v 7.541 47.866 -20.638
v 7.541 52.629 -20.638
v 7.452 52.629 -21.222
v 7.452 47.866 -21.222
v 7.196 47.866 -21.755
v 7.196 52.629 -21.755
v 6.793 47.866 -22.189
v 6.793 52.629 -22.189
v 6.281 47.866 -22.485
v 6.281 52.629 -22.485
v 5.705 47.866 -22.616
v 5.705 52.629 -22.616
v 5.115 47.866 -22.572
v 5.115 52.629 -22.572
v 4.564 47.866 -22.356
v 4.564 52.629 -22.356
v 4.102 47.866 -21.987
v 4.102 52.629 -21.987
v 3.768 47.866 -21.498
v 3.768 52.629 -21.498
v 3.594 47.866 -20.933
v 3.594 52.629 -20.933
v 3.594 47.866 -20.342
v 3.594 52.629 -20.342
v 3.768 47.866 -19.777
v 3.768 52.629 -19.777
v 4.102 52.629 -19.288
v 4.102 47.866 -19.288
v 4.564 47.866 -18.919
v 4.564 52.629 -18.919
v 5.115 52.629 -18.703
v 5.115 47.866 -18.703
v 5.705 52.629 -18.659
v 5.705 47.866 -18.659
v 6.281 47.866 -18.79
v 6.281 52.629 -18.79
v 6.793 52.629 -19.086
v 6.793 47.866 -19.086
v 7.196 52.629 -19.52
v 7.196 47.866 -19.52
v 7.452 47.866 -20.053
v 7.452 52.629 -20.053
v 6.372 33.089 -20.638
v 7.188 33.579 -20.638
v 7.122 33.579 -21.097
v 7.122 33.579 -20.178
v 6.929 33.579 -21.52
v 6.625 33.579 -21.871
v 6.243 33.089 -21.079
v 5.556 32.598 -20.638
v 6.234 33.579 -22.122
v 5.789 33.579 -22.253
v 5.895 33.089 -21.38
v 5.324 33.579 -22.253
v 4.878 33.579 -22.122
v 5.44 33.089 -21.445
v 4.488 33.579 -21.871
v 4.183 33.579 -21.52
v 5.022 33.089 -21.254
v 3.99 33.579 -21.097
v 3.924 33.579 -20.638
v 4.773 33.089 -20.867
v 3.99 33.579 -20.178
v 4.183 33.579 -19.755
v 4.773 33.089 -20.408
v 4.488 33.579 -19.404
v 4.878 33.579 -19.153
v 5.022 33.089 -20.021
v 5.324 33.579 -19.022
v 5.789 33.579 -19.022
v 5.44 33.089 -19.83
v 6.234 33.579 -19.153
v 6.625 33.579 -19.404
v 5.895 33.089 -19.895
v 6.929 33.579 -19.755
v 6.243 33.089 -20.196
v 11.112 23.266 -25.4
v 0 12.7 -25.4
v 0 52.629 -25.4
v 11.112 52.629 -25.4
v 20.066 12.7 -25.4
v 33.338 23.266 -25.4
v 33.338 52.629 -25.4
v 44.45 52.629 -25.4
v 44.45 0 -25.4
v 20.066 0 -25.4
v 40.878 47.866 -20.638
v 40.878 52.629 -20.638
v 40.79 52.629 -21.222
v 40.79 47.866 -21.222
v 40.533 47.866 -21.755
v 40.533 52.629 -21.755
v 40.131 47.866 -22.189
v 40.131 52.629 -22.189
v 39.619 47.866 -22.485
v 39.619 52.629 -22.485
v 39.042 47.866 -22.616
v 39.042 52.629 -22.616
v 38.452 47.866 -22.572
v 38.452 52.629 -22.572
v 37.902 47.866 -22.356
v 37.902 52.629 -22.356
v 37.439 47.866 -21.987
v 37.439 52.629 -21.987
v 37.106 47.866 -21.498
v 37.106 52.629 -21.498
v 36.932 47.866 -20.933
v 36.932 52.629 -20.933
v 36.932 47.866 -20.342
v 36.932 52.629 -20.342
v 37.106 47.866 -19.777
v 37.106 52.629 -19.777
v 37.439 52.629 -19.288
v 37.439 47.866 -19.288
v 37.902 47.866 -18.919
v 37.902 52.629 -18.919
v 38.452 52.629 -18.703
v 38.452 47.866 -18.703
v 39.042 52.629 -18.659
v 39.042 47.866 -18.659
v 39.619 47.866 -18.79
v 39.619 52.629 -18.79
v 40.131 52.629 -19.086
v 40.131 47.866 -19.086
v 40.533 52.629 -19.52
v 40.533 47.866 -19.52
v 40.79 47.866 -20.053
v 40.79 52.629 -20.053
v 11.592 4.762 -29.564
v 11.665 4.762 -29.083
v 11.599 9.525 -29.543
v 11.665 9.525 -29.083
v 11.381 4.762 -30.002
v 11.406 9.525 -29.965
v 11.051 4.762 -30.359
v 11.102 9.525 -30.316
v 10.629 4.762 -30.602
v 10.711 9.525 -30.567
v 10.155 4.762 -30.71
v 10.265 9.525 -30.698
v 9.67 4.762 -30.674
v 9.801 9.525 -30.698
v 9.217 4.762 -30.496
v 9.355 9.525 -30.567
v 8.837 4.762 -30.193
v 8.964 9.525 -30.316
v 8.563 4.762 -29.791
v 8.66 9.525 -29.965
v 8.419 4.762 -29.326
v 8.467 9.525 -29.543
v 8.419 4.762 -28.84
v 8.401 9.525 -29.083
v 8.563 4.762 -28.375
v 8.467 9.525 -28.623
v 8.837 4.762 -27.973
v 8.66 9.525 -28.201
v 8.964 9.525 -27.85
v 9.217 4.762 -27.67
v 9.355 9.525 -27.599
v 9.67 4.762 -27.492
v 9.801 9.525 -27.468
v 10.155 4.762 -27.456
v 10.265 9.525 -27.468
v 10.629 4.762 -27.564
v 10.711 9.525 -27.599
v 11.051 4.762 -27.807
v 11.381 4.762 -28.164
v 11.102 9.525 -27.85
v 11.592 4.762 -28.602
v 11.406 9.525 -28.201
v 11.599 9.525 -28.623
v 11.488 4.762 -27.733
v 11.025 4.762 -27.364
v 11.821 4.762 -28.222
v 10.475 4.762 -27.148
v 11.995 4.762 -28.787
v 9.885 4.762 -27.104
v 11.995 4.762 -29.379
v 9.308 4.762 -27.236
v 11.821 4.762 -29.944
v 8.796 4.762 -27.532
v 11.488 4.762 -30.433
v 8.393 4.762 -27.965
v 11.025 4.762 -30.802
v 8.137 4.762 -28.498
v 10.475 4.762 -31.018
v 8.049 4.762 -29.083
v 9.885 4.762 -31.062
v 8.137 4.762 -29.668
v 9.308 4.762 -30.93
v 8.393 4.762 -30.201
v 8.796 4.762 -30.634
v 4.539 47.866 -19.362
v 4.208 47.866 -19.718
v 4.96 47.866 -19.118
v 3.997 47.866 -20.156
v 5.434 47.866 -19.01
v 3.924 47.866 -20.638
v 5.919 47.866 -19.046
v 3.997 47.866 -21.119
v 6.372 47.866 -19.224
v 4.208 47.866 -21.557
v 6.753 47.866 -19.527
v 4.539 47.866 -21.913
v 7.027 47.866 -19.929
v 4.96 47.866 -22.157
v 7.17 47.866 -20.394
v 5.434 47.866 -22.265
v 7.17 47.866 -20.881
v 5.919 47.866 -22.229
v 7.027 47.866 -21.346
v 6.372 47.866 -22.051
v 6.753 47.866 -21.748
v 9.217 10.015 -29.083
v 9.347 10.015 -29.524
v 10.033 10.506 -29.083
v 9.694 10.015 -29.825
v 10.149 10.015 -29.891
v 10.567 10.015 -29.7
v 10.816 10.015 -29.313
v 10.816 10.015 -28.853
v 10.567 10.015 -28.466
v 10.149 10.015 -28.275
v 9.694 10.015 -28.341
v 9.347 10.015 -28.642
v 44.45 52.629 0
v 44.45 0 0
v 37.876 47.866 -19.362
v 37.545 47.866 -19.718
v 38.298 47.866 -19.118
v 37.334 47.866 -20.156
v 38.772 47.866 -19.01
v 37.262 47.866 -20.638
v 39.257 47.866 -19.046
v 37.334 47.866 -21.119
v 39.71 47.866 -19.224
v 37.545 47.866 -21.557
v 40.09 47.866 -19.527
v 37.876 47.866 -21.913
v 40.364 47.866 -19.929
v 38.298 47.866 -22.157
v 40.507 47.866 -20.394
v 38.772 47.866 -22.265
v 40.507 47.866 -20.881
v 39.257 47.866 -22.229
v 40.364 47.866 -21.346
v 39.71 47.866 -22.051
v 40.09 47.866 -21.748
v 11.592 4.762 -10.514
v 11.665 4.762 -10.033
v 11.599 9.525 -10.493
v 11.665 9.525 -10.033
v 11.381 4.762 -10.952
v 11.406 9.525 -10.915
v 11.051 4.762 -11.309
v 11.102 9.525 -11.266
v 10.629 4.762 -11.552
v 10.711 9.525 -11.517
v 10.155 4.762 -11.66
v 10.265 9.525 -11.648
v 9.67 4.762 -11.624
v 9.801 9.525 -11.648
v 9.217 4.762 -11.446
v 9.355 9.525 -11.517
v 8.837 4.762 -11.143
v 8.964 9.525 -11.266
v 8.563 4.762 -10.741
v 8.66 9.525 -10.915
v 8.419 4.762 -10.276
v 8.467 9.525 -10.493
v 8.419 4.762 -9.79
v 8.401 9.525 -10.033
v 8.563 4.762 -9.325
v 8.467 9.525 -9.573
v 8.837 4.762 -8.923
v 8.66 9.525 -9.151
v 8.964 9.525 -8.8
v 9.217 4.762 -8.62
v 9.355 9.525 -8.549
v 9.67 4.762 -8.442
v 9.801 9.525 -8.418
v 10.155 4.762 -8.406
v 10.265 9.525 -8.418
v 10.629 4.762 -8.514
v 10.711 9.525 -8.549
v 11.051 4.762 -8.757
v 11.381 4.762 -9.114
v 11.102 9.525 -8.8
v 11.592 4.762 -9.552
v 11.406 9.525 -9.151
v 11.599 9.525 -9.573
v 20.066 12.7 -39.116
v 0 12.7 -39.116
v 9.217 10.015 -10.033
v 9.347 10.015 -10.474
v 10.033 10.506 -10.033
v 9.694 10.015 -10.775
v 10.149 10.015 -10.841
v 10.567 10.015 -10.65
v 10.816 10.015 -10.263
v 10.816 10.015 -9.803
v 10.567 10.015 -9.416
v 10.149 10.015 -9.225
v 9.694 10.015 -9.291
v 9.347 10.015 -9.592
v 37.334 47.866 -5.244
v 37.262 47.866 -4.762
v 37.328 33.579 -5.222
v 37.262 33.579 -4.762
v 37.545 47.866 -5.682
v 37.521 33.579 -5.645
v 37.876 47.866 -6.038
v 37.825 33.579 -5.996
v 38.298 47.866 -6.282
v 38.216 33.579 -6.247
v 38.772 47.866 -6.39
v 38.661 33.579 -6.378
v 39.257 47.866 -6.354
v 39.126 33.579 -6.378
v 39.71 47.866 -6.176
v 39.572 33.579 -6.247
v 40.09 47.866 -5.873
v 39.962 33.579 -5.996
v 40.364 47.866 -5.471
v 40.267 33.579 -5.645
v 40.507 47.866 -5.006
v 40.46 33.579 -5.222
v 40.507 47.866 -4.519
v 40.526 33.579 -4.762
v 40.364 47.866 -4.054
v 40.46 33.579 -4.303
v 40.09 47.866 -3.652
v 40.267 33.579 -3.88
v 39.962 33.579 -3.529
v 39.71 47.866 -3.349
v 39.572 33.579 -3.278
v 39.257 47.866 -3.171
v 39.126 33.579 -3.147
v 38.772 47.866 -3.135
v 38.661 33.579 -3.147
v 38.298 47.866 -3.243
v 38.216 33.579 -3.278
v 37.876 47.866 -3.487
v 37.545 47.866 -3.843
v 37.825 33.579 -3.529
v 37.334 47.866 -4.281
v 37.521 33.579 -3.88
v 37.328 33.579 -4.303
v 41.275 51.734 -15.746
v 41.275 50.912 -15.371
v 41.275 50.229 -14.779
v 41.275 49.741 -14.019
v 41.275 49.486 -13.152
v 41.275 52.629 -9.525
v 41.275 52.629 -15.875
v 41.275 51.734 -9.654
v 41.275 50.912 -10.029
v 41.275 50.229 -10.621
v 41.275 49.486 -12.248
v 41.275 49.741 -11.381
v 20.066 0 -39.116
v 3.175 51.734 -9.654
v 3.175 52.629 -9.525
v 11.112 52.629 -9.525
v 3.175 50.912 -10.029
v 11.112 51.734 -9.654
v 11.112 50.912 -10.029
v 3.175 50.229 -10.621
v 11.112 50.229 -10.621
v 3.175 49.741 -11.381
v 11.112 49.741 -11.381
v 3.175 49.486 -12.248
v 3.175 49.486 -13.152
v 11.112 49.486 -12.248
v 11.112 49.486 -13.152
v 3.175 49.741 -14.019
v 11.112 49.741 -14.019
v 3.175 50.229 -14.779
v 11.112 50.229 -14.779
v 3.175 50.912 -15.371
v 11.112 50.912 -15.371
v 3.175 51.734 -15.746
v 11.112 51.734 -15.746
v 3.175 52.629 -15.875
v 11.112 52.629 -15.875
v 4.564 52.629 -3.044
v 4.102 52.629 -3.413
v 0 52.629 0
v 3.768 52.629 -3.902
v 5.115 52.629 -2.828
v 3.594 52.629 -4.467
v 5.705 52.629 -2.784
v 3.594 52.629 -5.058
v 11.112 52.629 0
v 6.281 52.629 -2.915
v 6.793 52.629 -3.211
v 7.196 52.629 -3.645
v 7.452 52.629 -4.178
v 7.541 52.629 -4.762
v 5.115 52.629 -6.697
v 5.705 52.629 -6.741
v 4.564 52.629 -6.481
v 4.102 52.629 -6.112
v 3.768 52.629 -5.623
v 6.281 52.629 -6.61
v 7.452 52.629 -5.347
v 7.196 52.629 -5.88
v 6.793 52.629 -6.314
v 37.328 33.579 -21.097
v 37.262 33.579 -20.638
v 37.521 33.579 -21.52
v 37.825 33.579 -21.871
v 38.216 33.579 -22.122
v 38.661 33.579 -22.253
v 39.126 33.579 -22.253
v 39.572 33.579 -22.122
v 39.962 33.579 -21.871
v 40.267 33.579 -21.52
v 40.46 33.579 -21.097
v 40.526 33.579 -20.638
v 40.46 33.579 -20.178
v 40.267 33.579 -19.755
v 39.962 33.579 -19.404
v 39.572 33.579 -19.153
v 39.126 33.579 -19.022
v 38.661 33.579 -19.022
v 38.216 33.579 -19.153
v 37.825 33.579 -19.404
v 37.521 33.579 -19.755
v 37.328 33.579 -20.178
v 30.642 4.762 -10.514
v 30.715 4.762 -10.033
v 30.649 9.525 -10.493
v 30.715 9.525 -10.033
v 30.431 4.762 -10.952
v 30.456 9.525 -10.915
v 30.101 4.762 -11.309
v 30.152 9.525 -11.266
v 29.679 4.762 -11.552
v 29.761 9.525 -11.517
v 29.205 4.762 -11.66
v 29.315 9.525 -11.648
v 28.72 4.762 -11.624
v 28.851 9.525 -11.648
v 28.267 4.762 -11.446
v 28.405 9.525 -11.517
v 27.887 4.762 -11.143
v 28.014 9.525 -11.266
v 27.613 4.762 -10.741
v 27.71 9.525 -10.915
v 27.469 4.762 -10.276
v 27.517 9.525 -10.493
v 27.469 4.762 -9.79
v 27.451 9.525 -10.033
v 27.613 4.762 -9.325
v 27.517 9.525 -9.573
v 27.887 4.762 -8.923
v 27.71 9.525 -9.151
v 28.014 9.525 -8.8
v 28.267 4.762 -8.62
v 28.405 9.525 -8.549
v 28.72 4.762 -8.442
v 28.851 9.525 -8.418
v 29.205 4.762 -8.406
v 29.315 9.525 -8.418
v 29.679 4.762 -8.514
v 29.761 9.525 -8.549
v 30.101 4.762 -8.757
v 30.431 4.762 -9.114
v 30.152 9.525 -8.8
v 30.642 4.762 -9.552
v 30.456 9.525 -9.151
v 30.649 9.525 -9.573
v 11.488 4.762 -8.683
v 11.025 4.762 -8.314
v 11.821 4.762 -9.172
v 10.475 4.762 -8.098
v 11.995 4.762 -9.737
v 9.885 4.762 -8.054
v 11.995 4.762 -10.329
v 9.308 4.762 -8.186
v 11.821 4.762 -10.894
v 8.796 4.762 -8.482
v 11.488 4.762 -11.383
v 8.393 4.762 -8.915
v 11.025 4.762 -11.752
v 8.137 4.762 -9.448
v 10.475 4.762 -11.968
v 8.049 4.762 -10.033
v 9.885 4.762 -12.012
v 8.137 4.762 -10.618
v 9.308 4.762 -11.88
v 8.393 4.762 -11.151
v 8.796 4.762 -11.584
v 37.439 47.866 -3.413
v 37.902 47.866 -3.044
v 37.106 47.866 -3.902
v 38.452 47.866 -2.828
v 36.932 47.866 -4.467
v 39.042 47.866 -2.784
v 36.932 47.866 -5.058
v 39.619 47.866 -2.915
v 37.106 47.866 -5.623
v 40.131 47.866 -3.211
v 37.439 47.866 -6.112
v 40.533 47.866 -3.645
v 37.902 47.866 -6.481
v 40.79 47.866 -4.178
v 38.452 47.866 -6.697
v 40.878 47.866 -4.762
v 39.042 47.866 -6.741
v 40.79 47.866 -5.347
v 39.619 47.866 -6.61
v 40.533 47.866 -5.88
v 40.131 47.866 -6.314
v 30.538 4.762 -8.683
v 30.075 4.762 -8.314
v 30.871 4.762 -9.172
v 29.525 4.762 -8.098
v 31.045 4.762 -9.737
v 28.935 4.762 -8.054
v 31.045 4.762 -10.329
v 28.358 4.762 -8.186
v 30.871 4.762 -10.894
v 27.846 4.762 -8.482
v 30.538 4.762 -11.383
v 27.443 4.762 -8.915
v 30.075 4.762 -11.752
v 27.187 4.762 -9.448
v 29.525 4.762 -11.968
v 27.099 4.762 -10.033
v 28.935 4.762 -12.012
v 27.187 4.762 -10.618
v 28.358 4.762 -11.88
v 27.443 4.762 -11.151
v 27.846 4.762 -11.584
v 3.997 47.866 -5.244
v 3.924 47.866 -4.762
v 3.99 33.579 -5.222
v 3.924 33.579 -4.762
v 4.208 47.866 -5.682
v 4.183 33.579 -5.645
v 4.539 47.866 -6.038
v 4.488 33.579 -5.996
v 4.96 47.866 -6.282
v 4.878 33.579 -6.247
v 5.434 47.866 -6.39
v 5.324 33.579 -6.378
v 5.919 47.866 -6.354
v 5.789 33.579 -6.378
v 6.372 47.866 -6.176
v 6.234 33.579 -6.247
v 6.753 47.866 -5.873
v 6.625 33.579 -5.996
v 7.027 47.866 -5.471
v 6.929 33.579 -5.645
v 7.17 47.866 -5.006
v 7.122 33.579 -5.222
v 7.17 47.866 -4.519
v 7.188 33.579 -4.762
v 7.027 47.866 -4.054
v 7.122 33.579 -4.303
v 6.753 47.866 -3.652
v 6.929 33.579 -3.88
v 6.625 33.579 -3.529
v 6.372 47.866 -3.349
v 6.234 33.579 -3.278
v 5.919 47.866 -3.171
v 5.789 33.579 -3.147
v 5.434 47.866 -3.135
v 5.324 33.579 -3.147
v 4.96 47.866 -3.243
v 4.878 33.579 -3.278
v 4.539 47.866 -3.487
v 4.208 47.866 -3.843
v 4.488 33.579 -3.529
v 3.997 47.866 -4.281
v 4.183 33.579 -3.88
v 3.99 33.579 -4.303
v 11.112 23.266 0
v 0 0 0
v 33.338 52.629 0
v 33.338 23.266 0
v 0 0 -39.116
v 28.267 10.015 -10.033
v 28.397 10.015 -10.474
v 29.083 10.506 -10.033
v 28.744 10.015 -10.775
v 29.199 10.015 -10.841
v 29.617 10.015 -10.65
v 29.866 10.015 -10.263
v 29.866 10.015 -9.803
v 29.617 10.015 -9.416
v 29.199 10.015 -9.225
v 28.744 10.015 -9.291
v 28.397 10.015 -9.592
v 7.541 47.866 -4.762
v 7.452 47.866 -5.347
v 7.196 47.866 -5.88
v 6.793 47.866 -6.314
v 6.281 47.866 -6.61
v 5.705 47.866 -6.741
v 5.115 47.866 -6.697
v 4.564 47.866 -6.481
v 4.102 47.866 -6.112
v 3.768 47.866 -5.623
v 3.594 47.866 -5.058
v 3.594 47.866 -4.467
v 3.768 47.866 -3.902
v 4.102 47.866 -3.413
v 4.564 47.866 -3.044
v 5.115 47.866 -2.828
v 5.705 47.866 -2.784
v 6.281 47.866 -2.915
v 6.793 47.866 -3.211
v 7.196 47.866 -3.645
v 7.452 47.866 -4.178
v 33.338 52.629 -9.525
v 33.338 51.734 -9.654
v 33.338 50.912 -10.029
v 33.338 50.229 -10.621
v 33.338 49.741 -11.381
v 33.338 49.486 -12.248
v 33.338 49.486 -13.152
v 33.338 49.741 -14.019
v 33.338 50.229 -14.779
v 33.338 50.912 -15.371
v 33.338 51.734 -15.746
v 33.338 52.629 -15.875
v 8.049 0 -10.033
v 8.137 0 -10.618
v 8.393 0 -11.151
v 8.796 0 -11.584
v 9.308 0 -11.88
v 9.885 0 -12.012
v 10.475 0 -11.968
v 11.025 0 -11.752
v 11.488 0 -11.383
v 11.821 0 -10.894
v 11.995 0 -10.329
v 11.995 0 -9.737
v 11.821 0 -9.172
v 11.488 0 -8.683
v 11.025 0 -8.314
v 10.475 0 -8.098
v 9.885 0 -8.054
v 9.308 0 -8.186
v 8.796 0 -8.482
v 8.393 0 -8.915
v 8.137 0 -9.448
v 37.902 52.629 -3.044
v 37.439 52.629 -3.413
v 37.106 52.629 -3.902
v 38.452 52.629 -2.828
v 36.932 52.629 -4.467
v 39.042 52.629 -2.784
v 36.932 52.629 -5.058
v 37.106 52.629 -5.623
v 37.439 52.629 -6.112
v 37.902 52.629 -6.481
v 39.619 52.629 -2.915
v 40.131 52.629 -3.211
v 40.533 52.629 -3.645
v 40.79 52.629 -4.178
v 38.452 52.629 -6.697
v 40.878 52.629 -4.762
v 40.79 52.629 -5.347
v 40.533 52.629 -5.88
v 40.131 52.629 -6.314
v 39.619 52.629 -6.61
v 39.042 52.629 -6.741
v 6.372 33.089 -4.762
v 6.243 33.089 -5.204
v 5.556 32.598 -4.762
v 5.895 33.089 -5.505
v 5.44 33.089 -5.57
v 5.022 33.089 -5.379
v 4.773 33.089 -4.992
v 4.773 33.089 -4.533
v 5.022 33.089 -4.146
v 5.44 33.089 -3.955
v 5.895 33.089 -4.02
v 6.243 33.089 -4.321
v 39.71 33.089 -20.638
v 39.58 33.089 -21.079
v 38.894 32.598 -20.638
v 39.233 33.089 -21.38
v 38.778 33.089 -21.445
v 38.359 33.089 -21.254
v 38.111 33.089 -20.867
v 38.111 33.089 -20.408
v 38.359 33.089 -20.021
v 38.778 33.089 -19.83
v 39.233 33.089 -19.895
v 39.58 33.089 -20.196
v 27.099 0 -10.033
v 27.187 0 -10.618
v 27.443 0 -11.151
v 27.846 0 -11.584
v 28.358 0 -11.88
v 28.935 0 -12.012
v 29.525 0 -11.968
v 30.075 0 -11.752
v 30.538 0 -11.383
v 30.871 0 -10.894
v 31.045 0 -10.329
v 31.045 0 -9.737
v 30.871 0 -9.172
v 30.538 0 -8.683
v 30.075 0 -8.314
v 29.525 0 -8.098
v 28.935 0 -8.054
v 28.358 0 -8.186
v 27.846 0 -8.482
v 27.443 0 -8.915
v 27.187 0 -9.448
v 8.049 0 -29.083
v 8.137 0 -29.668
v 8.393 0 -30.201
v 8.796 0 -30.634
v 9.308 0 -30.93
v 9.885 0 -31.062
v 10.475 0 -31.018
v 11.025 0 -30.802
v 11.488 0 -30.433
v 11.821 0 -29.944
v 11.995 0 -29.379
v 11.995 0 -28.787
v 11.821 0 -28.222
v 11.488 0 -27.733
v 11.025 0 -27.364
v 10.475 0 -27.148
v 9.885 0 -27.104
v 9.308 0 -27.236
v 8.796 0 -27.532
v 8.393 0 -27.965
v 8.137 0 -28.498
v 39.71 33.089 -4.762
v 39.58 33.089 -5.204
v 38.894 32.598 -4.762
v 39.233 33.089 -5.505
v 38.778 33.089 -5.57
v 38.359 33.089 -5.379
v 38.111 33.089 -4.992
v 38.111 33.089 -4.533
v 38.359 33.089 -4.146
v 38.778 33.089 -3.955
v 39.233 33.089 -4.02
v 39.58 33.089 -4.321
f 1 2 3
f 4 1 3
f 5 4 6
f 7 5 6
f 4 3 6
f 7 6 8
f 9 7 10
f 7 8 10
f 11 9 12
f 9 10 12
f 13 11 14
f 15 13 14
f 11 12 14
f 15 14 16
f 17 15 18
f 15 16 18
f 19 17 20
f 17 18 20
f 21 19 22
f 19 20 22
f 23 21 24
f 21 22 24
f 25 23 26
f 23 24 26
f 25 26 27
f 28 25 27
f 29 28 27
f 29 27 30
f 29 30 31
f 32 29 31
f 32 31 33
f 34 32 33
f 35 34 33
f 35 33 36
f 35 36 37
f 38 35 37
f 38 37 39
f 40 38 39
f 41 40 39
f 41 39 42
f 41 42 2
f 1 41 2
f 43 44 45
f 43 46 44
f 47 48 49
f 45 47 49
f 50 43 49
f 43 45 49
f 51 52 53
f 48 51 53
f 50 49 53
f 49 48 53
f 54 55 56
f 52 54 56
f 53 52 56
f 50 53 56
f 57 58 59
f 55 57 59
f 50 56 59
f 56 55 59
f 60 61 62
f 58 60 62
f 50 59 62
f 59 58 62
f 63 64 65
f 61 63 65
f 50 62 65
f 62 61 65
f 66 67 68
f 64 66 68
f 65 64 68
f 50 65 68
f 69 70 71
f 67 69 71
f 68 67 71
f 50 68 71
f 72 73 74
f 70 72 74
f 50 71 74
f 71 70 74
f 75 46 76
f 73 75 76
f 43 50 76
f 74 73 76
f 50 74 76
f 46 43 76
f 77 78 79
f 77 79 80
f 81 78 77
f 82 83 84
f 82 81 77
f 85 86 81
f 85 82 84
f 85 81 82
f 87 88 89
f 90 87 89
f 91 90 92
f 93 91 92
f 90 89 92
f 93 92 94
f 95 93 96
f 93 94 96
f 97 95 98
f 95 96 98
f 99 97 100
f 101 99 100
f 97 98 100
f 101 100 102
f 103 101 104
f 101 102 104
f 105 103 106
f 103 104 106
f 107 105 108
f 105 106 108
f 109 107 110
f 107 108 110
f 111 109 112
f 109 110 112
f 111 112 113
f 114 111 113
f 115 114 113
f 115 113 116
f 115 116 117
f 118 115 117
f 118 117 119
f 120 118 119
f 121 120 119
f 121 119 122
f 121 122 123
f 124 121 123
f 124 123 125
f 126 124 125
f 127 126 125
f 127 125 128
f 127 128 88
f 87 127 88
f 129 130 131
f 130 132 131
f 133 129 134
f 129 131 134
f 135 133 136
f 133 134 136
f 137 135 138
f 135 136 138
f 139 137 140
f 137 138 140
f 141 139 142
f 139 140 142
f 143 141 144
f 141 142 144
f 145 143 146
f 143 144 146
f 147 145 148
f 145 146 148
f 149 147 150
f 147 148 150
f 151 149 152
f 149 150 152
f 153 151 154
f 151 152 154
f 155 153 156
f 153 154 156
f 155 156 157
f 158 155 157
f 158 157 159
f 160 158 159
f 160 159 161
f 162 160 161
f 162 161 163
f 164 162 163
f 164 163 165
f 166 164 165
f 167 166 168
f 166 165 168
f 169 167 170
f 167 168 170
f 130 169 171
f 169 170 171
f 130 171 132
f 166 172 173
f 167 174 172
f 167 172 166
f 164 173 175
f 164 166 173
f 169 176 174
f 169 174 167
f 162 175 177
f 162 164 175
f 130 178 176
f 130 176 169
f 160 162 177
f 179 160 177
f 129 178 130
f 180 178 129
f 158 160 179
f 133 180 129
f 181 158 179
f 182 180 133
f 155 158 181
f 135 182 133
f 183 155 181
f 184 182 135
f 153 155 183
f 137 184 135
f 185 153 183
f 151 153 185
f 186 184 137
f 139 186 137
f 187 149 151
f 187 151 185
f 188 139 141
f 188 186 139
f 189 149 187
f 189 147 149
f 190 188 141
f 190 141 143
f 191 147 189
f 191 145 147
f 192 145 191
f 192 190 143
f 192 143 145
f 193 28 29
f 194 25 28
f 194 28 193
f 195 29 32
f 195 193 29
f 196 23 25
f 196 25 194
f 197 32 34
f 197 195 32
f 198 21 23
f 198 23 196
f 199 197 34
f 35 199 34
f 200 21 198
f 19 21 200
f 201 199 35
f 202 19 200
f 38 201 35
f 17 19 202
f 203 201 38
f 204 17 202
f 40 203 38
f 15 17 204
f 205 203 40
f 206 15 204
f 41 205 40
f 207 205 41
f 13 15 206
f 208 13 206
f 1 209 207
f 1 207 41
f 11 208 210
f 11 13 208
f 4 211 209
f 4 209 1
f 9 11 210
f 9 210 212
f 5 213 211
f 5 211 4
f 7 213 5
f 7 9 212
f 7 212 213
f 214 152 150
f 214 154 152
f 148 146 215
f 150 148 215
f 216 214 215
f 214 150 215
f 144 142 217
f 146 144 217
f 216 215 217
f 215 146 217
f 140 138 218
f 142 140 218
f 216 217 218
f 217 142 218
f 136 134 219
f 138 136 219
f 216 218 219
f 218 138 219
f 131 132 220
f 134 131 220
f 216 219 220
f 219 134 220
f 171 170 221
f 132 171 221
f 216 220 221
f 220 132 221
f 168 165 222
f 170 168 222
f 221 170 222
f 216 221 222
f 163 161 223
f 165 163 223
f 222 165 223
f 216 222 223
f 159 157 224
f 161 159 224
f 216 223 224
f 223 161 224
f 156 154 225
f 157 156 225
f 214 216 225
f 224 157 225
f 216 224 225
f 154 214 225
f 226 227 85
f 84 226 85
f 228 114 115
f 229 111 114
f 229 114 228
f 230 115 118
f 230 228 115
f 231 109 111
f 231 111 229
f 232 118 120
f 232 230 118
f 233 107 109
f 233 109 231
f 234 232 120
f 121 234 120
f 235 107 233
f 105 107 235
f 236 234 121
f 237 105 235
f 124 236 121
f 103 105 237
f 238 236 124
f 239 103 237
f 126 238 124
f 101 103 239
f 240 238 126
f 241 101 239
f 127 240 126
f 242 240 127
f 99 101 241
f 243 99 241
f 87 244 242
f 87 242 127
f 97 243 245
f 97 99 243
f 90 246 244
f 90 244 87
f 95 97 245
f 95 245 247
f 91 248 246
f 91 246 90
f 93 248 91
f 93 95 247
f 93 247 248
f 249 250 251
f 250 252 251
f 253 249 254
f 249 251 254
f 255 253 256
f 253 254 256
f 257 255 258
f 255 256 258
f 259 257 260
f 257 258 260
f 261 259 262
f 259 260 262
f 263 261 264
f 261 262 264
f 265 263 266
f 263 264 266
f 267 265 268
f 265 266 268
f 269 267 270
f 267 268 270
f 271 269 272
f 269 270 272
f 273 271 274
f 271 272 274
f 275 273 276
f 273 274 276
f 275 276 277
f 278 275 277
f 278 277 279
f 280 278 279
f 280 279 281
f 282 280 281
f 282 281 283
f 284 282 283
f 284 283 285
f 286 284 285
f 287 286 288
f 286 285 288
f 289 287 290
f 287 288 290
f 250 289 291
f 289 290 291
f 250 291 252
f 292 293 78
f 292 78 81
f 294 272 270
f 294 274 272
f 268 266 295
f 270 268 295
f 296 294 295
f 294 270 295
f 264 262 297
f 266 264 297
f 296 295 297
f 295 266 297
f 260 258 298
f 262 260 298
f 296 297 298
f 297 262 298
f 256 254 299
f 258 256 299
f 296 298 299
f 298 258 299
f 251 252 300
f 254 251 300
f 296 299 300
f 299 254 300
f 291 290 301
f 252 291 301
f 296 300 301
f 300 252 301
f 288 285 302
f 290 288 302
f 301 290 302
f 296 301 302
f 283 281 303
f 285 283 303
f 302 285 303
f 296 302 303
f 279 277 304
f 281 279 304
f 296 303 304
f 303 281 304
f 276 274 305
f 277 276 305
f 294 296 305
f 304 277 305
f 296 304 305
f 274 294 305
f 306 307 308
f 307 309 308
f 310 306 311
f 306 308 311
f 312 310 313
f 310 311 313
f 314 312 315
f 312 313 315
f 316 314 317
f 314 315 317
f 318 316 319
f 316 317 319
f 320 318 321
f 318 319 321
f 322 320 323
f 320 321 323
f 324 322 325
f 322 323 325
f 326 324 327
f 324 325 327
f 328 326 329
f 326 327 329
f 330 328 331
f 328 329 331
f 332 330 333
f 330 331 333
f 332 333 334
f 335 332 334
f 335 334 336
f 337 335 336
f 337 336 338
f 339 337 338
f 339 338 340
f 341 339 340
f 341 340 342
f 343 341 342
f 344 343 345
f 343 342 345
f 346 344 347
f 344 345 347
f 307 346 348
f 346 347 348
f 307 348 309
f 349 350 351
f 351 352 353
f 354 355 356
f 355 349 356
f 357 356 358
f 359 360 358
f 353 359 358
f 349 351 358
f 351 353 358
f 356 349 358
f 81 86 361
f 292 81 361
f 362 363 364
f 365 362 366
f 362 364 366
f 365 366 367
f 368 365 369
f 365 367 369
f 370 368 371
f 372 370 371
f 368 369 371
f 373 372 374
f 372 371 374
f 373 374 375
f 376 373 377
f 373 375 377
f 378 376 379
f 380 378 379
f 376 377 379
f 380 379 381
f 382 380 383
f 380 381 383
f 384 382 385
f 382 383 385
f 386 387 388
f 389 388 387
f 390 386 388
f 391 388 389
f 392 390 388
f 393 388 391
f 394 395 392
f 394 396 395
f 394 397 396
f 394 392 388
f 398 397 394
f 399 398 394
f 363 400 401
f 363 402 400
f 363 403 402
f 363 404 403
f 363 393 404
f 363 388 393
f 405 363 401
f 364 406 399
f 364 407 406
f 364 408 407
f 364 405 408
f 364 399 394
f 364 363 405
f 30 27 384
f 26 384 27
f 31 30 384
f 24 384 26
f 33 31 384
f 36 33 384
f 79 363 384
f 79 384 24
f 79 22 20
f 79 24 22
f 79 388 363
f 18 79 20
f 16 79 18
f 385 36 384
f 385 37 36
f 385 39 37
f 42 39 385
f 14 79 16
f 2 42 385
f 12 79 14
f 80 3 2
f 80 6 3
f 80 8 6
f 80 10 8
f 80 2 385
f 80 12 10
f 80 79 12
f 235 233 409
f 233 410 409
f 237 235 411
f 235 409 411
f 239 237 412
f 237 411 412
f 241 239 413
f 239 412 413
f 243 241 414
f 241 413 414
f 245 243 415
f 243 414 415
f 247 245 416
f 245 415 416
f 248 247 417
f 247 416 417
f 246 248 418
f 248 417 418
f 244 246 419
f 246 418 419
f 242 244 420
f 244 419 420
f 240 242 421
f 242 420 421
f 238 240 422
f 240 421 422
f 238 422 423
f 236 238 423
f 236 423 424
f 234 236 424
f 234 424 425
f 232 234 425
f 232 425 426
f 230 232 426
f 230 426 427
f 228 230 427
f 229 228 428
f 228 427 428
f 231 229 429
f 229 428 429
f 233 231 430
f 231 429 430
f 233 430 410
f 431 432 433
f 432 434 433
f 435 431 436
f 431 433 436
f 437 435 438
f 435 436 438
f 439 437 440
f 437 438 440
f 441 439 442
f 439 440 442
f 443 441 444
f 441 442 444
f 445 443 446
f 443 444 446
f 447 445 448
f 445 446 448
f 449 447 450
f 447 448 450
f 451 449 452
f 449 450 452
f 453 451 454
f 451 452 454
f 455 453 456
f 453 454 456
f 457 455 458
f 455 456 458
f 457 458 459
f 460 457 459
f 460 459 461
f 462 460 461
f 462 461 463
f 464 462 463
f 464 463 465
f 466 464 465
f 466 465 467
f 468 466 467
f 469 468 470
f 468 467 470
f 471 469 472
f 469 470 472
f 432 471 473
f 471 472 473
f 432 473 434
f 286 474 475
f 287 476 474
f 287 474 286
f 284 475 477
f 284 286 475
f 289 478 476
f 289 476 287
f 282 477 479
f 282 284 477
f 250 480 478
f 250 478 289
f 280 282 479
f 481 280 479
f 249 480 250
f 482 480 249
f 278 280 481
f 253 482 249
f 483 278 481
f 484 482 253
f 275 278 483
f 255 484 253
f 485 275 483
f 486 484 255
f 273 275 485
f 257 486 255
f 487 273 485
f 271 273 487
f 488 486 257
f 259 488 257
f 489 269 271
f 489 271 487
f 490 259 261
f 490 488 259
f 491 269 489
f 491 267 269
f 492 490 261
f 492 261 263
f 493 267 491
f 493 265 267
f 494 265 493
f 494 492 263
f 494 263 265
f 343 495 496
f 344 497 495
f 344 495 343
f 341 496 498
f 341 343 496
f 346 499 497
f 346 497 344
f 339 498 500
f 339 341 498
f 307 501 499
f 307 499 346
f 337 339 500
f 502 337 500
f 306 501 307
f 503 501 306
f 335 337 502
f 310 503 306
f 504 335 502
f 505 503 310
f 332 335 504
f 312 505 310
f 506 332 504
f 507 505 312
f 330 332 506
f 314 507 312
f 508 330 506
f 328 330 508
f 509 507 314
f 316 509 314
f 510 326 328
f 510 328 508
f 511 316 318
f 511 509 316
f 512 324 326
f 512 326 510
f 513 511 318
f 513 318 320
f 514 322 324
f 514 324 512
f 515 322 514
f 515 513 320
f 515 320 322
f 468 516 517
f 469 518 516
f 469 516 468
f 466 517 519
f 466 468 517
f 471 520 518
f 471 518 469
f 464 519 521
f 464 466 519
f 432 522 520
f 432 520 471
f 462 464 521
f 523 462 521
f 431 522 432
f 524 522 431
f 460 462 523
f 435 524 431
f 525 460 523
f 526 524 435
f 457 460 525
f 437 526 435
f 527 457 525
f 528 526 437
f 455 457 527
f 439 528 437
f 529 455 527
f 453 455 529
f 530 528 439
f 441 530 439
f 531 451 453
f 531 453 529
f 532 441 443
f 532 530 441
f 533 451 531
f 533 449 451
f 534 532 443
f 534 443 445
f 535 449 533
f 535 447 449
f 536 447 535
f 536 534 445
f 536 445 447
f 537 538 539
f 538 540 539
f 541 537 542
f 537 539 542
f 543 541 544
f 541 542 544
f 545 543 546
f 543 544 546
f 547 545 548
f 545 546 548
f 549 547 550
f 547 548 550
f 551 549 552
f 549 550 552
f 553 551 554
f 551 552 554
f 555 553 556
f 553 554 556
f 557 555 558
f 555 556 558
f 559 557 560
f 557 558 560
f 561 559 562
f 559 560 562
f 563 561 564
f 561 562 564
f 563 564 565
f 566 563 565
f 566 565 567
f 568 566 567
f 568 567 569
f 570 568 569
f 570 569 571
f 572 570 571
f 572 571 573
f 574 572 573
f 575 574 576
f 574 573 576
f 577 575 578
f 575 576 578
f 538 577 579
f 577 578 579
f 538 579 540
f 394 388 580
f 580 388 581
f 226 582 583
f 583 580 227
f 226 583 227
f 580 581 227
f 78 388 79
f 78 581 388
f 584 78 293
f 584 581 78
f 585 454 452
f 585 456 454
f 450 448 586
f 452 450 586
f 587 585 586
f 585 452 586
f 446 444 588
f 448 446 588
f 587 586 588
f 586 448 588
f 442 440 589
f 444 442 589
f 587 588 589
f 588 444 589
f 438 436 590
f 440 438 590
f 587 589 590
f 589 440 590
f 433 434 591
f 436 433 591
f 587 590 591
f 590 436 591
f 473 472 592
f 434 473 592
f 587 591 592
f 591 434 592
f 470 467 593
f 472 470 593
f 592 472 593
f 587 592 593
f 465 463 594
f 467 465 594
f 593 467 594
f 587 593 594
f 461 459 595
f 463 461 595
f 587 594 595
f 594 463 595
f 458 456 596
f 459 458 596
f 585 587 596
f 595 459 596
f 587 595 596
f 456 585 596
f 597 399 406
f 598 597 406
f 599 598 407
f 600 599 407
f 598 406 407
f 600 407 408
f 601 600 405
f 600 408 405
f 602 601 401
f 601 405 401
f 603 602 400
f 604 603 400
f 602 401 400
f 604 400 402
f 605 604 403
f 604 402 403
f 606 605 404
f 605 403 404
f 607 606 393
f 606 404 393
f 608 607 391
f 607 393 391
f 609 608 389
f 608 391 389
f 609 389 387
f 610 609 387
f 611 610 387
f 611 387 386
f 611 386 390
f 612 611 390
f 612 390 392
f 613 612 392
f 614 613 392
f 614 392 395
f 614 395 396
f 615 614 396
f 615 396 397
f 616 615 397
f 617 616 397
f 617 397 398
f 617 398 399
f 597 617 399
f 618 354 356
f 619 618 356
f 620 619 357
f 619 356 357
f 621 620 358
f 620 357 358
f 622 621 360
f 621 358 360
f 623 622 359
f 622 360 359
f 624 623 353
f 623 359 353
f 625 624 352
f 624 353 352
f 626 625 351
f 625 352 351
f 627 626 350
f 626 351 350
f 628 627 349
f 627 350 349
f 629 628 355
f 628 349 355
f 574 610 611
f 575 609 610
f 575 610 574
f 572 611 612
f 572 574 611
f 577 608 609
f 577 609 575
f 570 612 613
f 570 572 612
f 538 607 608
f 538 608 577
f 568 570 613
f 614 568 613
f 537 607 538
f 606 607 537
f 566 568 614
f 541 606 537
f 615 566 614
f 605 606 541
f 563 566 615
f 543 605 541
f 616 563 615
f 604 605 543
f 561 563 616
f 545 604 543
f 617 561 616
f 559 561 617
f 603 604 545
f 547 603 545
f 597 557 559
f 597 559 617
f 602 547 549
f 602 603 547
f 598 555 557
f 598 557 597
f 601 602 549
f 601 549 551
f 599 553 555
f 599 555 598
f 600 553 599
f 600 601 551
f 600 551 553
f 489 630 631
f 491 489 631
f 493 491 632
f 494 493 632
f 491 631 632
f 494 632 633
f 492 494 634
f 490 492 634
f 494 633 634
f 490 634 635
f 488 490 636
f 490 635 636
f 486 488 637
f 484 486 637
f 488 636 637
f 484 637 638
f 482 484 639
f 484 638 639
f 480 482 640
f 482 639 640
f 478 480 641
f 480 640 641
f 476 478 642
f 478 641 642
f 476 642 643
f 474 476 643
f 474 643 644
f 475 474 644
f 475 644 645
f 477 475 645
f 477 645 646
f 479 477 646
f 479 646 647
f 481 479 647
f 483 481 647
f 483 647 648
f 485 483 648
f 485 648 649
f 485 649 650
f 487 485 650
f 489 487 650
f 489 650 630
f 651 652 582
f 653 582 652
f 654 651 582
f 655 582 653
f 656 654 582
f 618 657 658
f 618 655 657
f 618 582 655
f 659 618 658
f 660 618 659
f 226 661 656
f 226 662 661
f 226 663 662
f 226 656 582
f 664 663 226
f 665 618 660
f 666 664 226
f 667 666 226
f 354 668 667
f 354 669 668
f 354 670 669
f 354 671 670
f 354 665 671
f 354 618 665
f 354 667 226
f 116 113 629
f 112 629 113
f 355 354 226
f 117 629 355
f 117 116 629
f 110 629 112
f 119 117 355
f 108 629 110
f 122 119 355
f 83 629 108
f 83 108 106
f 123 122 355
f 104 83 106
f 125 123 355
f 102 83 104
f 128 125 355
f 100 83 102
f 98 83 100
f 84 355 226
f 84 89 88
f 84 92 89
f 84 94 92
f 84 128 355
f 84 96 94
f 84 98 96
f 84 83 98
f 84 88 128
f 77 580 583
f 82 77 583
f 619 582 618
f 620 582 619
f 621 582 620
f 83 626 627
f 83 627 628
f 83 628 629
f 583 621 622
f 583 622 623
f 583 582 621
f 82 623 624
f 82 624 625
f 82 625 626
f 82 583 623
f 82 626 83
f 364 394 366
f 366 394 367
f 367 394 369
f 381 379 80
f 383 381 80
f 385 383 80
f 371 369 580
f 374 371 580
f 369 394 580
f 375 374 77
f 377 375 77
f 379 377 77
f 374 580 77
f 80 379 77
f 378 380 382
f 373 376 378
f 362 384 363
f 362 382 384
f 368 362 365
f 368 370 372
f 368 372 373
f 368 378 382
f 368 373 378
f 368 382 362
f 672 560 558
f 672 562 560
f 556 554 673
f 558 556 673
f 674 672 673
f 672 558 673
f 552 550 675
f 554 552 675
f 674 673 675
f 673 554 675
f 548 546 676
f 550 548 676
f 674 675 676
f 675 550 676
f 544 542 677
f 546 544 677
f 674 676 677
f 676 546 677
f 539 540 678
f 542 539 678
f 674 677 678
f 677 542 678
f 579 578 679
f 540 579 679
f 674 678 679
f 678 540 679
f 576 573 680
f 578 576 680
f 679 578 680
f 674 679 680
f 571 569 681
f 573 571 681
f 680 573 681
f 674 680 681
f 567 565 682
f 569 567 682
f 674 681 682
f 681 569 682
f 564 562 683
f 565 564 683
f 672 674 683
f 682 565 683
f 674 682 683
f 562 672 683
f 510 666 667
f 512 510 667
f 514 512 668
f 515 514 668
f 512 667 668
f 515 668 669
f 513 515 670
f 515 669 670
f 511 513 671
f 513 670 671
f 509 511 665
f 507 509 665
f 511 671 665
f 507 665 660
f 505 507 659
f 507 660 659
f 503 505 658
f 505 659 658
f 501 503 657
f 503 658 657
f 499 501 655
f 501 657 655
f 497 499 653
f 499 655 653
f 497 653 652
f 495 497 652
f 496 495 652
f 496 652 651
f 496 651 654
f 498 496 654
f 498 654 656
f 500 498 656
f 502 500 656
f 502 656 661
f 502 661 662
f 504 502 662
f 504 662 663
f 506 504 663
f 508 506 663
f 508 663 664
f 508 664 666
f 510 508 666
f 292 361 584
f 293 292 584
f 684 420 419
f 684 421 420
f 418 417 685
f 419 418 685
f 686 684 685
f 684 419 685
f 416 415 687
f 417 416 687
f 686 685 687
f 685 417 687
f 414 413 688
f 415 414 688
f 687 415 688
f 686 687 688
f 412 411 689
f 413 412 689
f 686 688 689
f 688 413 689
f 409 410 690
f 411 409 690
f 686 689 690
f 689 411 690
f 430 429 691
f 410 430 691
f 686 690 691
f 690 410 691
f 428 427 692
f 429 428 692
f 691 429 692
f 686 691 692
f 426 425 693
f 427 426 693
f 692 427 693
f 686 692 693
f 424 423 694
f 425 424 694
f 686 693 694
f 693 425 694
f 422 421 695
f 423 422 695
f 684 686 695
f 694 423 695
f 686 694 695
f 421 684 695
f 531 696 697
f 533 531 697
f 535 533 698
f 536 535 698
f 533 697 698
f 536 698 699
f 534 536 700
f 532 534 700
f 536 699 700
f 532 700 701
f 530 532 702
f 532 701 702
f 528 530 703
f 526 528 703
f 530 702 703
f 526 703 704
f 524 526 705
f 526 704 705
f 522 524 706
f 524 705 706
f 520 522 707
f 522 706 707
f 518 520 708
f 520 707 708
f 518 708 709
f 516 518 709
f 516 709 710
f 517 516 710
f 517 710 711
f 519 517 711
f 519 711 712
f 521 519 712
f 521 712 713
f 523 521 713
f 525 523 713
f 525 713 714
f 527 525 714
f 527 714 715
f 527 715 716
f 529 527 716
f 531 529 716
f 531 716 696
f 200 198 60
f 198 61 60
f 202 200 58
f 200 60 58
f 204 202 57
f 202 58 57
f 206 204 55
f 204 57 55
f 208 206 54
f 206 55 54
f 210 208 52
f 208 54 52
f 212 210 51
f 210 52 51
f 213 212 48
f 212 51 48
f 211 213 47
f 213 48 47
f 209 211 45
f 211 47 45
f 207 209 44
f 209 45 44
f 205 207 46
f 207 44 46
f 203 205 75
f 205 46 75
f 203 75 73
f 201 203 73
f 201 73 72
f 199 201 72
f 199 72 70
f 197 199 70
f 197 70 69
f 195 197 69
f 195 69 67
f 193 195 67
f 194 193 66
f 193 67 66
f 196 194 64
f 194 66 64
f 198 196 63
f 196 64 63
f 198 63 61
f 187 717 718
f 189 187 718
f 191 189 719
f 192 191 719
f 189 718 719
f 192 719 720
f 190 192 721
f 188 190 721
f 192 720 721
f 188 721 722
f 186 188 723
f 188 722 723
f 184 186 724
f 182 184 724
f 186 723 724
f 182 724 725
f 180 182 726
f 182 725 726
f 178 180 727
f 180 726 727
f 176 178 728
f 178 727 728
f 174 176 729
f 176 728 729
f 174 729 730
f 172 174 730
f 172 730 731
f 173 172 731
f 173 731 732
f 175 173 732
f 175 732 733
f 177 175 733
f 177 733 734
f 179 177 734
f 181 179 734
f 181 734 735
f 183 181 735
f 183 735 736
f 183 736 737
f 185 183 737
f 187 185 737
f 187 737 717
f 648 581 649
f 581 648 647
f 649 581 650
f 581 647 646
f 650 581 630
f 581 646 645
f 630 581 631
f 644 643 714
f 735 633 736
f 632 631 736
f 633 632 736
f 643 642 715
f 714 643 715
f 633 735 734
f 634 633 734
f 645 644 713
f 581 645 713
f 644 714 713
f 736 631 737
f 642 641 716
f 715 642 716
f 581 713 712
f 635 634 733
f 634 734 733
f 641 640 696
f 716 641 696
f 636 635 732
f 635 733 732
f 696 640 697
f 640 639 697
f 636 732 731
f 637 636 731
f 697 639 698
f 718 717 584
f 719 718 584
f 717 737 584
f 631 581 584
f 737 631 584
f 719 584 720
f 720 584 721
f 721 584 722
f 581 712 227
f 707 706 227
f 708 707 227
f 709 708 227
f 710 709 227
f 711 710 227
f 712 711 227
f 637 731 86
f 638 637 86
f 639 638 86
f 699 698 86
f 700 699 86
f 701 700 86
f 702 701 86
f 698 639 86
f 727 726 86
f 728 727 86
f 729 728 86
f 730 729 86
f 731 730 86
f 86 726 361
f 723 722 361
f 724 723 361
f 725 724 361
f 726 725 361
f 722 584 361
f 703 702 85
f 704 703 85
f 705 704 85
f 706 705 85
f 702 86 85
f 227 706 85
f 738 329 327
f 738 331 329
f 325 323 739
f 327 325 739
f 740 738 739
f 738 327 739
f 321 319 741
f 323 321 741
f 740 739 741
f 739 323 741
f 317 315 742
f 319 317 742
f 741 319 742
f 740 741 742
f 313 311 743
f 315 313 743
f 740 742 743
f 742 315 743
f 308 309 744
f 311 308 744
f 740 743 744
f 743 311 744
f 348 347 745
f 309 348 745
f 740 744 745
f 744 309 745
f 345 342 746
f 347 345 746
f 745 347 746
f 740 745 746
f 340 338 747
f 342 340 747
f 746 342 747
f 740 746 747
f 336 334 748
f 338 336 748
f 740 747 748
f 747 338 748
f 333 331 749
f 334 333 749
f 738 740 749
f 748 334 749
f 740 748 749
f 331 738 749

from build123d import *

# Parameters (mm, degrees)
L_BASE_DEPTH                                = 12.7
SKETCH3_W                                   = 44.45
SKETCH3_H                                   = 25.4
RECTANGULAR_EXTRUDE_DEPTH                   = 10.5664
SKETCH4_W                                   = 11.1125
SKETCH4_H                                   = 25.4
FORK_EXTRUDE_DEPTH                          = 29.3624
SKETCH6_W                                   = 38.1
SKETCH6_H                                   = 3.175
F_4_EXPANSION_INSERT_RECESSES_1_D           = 3.2639
F_4_EXPANSION_INSERT_RECESSES_1_DEPTH       = 19.05
F_4_EXPANSION_INSERT_RECESSES_1_CBORE_D     = 3.96875
F_4_EXPANSION_INSERT_RECESSES_1_CBORE_DEPTH = 4.7625
F_4_EXPANSION_INSERT_RECESSES_1_TIP         = 0.980574487
F_4_EXPANSION_INSERT_RECESSES_2_D           = 3.2639
F_4_EXPANSION_INSERT_RECESSES_2_DEPTH       = 9.525
F_4_EXPANSION_INSERT_RECESSES_2_CBORE_D     = 3.96875
F_4_EXPANSION_INSERT_RECESSES_2_CBORE_DEPTH = 4.7625
F_4_EXPANSION_INSERT_RECESSES_2_TIP         = 0.980574487


with BuildPart() as part:
    # Sketch1 → L-Base (new body)
    with BuildSketch(Plane(origin=(0, 0, 0), x_dir=(1, 0, 0), z_dir=(0, 1, 0))):
        Polygon((0, 0), (44.45, 0), (44.45, 25.4), (20.066, 25.4), (20.066, 39.116), (0, 39.116), align=None)
    extrude(amount=L_BASE_DEPTH)

    # Sketch3 → Rectangular Extrude (add)
    with BuildSketch(Plane(origin=(0, 12.7, 0), x_dir=(1, 0, 0), z_dir=(0, 1, 0))):
        with Locations((22.225, 12.7)):
            Rectangle(SKETCH3_W, SKETCH3_H)
    extrude(amount=RECTANGULAR_EXTRUDE_DEPTH)

    # Sketch4 → Fork Extrude (add)
    with BuildSketch(Plane(origin=(0, 23.2664, 0), x_dir=(1, 0, 0), z_dir=(0, 1, 0))):
        with Locations((5.55625, 12.7)):
            Rectangle(SKETCH4_W, SKETCH4_H)
        with Locations((38.89375, 12.7)):
            Rectangle(SKETCH4_W, SKETCH4_H)
    extrude(amount=FORK_EXTRUDE_DEPTH)

    # Sketch6 → Shaft Recess (revolve, cut)
    with BuildSketch(Plane(origin=(0, 52.6288, 0), x_dir=(1, 0, 0), z_dir=(0, 1, 0))):
        with Locations((22.225, 11.1125)):
            Rectangle(SKETCH6_W, SKETCH6_H)
    revolve(axis=Axis((0, 52.6288, -12.7), (1, 0, 0)), mode=Mode.SUBTRACT)

    # #4 Expansion Insert Recesses #1
    with Locations(Plane(origin=(0, 52.6288, 0), x_dir=(1, 0, 0), z_dir=(0, 1, 0))):
        with Locations((5.55625, 20.6375), (5.55625, 4.7625), (38.89375, 20.6375), (38.89375, 4.7625)):
            CounterBoreHole(F_4_EXPANSION_INSERT_RECESSES_1_D / 2, F_4_EXPANSION_INSERT_RECESSES_1_CBORE_D / 2, F_4_EXPANSION_INSERT_RECESSES_1_CBORE_DEPTH, depth=F_4_EXPANSION_INSERT_RECESSES_1_DEPTH)
            with Locations((0, 0, -(F_4_EXPANSION_INSERT_RECESSES_1_DEPTH + F_4_EXPANSION_INSERT_RECESSES_1_TIP / 2))):  # 118° drill point
                Cone(0, F_4_EXPANSION_INSERT_RECESSES_1_D / 2, F_4_EXPANSION_INSERT_RECESSES_1_TIP, mode=Mode.SUBTRACT)

    # #4 Expansion Insert Recesses #2
    with Locations(Plane(origin=(0, 0, 0), x_dir=(-1, 0, 0), z_dir=(0, -1, 0))):
        with Locations((-10.033, 10.033), (-29.083, 10.033), (-10.033, 29.083)):
            CounterBoreHole(F_4_EXPANSION_INSERT_RECESSES_2_D / 2, F_4_EXPANSION_INSERT_RECESSES_2_CBORE_D / 2, F_4_EXPANSION_INSERT_RECESSES_2_CBORE_DEPTH, depth=F_4_EXPANSION_INSERT_RECESSES_2_DEPTH)
            with Locations((0, 0, -(F_4_EXPANSION_INSERT_RECESSES_2_DEPTH + F_4_EXPANSION_INSERT_RECESSES_2_TIP / 2))):  # 118° drill point
                Cone(0, F_4_EXPANSION_INSERT_RECESSES_2_D / 2, F_4_EXPANSION_INSERT_RECESSES_2_TIP, mode=Mode.SUBTRACT)


solid = part.part
